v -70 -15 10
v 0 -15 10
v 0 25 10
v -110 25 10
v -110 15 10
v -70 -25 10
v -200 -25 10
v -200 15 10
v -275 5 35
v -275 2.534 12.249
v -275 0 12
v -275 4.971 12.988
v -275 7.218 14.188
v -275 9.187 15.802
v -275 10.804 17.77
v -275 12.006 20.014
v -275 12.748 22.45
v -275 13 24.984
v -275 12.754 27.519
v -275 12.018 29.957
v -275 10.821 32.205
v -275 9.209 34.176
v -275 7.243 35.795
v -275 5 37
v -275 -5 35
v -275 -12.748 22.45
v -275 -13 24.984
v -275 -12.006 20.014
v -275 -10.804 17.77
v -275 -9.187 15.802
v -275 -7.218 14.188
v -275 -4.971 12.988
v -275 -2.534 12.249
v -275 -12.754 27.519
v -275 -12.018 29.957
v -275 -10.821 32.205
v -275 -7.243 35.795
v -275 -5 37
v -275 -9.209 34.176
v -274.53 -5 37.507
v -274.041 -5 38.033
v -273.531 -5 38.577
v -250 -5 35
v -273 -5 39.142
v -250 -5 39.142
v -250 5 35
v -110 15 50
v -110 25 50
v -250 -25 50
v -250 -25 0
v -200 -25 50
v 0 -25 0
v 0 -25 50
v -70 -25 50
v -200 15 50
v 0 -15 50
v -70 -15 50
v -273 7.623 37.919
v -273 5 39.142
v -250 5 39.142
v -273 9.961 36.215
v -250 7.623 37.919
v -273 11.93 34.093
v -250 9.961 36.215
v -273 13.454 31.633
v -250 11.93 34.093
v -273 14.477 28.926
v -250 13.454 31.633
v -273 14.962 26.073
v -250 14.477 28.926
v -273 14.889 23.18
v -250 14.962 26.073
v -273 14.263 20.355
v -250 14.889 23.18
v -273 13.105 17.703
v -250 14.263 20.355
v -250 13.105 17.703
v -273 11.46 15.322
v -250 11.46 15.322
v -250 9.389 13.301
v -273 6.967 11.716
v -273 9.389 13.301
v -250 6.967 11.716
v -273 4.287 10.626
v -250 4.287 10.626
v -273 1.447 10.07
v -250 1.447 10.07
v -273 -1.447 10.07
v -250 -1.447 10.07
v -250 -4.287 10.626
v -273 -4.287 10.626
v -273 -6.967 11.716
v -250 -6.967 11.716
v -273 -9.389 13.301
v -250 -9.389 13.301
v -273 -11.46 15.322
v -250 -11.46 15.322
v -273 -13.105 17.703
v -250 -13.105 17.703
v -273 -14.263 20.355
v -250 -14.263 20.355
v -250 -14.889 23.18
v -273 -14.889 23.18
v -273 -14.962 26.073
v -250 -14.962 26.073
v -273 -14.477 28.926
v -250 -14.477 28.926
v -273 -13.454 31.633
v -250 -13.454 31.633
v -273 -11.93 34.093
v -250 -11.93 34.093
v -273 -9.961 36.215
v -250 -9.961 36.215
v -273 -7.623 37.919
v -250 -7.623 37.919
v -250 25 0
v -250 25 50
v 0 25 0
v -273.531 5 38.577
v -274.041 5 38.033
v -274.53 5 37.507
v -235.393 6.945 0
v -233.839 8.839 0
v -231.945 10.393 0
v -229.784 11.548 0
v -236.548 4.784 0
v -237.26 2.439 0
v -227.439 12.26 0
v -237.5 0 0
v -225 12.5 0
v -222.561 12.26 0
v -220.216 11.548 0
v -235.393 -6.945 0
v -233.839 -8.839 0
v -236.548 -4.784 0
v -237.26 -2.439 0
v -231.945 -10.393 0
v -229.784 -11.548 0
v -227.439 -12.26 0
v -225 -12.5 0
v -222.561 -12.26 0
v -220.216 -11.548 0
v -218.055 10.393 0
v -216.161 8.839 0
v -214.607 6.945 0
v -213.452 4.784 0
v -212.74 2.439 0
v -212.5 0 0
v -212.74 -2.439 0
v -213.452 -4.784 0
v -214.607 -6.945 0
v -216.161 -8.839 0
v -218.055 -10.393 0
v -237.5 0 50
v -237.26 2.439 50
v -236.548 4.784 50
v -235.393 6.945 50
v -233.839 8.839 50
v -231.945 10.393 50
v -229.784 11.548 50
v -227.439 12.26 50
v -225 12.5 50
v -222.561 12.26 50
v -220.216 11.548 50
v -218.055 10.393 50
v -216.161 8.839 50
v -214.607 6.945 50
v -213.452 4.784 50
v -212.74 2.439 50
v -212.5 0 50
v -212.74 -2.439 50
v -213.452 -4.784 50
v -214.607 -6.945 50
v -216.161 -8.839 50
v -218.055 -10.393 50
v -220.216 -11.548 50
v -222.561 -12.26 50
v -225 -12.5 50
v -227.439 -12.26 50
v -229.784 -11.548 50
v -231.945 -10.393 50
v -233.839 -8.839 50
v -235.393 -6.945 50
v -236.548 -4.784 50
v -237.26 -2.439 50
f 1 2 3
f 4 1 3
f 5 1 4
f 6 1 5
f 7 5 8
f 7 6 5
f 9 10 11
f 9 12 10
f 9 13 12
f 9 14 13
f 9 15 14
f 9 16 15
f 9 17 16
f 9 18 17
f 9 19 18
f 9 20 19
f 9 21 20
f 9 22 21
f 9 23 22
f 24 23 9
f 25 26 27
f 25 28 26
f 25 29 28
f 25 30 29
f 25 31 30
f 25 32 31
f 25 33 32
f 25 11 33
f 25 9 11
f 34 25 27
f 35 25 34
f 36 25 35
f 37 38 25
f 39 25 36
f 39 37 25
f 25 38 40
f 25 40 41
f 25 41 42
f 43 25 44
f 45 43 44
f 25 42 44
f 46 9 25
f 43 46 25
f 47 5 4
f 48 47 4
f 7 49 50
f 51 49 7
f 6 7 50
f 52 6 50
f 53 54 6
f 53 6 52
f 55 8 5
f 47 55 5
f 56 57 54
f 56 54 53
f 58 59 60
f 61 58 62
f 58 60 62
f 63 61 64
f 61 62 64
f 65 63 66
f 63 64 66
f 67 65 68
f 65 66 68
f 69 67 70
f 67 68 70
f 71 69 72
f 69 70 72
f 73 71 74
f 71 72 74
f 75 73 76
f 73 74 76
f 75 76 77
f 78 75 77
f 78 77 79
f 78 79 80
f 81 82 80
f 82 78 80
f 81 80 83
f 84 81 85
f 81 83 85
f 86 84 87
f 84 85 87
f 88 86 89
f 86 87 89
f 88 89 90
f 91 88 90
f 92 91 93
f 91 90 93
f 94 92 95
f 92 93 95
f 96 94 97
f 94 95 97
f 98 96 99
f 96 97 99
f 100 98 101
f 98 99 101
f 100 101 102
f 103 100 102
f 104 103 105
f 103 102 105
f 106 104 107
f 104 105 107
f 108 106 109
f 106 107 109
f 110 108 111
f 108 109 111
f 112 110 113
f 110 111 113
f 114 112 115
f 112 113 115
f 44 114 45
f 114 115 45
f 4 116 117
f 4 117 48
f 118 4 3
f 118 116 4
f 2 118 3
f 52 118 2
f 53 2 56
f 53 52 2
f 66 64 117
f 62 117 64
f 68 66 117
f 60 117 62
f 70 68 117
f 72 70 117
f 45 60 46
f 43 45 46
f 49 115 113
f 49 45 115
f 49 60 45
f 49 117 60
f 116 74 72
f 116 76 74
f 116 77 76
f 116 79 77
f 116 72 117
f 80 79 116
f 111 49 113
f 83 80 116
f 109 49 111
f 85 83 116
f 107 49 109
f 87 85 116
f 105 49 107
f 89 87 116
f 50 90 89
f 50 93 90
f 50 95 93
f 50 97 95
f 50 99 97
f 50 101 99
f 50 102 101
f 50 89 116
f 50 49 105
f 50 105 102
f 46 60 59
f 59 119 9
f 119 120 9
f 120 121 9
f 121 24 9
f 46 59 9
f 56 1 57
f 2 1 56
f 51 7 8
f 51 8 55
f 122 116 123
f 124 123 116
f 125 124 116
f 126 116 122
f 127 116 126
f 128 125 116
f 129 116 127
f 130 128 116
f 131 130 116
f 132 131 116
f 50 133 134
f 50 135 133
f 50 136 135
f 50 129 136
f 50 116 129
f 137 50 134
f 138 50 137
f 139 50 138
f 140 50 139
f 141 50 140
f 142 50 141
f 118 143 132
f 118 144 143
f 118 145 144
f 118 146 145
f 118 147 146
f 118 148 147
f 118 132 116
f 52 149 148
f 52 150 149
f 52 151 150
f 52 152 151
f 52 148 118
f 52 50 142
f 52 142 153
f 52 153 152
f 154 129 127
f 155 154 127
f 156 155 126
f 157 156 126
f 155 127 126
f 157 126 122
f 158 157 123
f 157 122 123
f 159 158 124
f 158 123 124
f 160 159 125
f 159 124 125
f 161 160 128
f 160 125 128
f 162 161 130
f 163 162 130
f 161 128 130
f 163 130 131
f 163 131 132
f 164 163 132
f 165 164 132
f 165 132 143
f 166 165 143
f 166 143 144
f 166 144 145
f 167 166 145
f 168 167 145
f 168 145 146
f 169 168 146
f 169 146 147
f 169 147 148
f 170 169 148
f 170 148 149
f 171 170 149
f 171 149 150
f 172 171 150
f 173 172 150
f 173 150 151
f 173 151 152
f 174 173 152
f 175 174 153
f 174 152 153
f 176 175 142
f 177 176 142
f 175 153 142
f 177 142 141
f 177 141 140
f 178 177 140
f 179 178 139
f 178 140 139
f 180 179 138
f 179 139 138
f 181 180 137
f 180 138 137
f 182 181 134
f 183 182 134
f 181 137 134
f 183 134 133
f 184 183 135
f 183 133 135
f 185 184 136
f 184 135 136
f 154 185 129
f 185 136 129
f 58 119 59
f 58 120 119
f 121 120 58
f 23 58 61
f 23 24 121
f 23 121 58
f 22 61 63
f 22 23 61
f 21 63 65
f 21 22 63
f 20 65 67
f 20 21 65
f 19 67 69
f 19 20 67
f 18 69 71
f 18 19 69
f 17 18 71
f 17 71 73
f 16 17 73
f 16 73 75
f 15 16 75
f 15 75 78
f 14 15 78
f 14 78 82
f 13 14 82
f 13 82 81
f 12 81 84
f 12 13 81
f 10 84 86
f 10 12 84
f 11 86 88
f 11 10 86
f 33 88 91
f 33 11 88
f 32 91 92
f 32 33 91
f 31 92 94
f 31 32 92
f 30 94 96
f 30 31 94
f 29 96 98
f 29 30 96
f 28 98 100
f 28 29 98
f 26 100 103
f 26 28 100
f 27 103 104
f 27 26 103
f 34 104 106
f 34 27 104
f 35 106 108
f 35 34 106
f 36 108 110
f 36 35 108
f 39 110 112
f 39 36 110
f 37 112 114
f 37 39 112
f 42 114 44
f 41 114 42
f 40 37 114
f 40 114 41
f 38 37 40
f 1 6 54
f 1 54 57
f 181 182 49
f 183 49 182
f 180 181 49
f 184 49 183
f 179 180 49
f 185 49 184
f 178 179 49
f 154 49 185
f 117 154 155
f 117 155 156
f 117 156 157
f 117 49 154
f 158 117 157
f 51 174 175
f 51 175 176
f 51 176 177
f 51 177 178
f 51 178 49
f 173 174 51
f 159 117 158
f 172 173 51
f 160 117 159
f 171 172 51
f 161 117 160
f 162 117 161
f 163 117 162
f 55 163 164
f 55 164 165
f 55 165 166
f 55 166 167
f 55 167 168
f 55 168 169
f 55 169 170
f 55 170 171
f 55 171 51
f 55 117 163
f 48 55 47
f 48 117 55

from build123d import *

# Parameters (mm, degrees)
F1_DEPTH  = 25
F2_W      = 90
F2_H      = 10
F2_W_2    = 70
F3_DEPTH  = 40
F4_R      = 15
F5_DEPTH  = 25
F6_SIZE   = 2
F8_D      = 25
F10_DEPTH = 25


with BuildPart() as f1:
    # F0 (on Front) → F1 (new body, symmetric)
    with BuildSketch(Plane.XZ):
        Polygon((-250, 0), (0, 0), (0, 10), (-200, 10), (-200, 50), (-250, 50), align=None)
    extrude(amount=F1_DEPTH, both=True)

    # F2 (on face) → F3 (join)
    with BuildSketch(Plane.XY.offset(10)):
        with Locations((-155, 20)):
            Rectangle(F2_W, F2_H)
        with Locations((-35, -20)):
            Rectangle(F2_W_2, F2_H)
    extrude(amount=F3_DEPTH)

    # F4 (on face) → F5 (join)
    with BuildSketch(Plane(origin=(-250, 0, 0), x_dir=(0, -1, 0), z_dir=(-1, 0, 0))):
        with Locations((0, 25)):
            Circle(F4_R)
    extrude(amount=F5_DEPTH)

    # F6
    f6_edges = [f1.edges().sort_by_distance(p)[0] for p in [
        (-275, 15, 25),
    ]]
    chamfer(f6_edges, length=F6_SIZE)

    # F8 (through all)
    with Locations(Plane.XY.offset(50)):
        with Locations((-225, 0)):
            Hole(F8_D / 2)

    # F9 (on face) → F10 (cut, through all)
    with BuildSketch(Plane(origin=(-275, 0, 0), x_dir=(0, -1, 0), z_dir=(-1, 0, 0))):
        with BuildLine():
            Line((5, 42), (-5, 42))
            Line((-5, 42), (-5, 37))
            ThreePointArc((-5, 37), (0, 38), (5, 37))
            Line((5, 37), (5, 42))
        make_face()
        with BuildLine():
            ThreePointArc((5, 37), (0, 38), (-5, 37))
            Line((-5, 37), (-5, 35))
            Line((-5, 35), (5, 35))
            Line((5, 35), (5, 37))
        make_face()
    extrude(amount=-F10_DEPTH, mode=Mode.SUBTRACT)


solid = f1.part
